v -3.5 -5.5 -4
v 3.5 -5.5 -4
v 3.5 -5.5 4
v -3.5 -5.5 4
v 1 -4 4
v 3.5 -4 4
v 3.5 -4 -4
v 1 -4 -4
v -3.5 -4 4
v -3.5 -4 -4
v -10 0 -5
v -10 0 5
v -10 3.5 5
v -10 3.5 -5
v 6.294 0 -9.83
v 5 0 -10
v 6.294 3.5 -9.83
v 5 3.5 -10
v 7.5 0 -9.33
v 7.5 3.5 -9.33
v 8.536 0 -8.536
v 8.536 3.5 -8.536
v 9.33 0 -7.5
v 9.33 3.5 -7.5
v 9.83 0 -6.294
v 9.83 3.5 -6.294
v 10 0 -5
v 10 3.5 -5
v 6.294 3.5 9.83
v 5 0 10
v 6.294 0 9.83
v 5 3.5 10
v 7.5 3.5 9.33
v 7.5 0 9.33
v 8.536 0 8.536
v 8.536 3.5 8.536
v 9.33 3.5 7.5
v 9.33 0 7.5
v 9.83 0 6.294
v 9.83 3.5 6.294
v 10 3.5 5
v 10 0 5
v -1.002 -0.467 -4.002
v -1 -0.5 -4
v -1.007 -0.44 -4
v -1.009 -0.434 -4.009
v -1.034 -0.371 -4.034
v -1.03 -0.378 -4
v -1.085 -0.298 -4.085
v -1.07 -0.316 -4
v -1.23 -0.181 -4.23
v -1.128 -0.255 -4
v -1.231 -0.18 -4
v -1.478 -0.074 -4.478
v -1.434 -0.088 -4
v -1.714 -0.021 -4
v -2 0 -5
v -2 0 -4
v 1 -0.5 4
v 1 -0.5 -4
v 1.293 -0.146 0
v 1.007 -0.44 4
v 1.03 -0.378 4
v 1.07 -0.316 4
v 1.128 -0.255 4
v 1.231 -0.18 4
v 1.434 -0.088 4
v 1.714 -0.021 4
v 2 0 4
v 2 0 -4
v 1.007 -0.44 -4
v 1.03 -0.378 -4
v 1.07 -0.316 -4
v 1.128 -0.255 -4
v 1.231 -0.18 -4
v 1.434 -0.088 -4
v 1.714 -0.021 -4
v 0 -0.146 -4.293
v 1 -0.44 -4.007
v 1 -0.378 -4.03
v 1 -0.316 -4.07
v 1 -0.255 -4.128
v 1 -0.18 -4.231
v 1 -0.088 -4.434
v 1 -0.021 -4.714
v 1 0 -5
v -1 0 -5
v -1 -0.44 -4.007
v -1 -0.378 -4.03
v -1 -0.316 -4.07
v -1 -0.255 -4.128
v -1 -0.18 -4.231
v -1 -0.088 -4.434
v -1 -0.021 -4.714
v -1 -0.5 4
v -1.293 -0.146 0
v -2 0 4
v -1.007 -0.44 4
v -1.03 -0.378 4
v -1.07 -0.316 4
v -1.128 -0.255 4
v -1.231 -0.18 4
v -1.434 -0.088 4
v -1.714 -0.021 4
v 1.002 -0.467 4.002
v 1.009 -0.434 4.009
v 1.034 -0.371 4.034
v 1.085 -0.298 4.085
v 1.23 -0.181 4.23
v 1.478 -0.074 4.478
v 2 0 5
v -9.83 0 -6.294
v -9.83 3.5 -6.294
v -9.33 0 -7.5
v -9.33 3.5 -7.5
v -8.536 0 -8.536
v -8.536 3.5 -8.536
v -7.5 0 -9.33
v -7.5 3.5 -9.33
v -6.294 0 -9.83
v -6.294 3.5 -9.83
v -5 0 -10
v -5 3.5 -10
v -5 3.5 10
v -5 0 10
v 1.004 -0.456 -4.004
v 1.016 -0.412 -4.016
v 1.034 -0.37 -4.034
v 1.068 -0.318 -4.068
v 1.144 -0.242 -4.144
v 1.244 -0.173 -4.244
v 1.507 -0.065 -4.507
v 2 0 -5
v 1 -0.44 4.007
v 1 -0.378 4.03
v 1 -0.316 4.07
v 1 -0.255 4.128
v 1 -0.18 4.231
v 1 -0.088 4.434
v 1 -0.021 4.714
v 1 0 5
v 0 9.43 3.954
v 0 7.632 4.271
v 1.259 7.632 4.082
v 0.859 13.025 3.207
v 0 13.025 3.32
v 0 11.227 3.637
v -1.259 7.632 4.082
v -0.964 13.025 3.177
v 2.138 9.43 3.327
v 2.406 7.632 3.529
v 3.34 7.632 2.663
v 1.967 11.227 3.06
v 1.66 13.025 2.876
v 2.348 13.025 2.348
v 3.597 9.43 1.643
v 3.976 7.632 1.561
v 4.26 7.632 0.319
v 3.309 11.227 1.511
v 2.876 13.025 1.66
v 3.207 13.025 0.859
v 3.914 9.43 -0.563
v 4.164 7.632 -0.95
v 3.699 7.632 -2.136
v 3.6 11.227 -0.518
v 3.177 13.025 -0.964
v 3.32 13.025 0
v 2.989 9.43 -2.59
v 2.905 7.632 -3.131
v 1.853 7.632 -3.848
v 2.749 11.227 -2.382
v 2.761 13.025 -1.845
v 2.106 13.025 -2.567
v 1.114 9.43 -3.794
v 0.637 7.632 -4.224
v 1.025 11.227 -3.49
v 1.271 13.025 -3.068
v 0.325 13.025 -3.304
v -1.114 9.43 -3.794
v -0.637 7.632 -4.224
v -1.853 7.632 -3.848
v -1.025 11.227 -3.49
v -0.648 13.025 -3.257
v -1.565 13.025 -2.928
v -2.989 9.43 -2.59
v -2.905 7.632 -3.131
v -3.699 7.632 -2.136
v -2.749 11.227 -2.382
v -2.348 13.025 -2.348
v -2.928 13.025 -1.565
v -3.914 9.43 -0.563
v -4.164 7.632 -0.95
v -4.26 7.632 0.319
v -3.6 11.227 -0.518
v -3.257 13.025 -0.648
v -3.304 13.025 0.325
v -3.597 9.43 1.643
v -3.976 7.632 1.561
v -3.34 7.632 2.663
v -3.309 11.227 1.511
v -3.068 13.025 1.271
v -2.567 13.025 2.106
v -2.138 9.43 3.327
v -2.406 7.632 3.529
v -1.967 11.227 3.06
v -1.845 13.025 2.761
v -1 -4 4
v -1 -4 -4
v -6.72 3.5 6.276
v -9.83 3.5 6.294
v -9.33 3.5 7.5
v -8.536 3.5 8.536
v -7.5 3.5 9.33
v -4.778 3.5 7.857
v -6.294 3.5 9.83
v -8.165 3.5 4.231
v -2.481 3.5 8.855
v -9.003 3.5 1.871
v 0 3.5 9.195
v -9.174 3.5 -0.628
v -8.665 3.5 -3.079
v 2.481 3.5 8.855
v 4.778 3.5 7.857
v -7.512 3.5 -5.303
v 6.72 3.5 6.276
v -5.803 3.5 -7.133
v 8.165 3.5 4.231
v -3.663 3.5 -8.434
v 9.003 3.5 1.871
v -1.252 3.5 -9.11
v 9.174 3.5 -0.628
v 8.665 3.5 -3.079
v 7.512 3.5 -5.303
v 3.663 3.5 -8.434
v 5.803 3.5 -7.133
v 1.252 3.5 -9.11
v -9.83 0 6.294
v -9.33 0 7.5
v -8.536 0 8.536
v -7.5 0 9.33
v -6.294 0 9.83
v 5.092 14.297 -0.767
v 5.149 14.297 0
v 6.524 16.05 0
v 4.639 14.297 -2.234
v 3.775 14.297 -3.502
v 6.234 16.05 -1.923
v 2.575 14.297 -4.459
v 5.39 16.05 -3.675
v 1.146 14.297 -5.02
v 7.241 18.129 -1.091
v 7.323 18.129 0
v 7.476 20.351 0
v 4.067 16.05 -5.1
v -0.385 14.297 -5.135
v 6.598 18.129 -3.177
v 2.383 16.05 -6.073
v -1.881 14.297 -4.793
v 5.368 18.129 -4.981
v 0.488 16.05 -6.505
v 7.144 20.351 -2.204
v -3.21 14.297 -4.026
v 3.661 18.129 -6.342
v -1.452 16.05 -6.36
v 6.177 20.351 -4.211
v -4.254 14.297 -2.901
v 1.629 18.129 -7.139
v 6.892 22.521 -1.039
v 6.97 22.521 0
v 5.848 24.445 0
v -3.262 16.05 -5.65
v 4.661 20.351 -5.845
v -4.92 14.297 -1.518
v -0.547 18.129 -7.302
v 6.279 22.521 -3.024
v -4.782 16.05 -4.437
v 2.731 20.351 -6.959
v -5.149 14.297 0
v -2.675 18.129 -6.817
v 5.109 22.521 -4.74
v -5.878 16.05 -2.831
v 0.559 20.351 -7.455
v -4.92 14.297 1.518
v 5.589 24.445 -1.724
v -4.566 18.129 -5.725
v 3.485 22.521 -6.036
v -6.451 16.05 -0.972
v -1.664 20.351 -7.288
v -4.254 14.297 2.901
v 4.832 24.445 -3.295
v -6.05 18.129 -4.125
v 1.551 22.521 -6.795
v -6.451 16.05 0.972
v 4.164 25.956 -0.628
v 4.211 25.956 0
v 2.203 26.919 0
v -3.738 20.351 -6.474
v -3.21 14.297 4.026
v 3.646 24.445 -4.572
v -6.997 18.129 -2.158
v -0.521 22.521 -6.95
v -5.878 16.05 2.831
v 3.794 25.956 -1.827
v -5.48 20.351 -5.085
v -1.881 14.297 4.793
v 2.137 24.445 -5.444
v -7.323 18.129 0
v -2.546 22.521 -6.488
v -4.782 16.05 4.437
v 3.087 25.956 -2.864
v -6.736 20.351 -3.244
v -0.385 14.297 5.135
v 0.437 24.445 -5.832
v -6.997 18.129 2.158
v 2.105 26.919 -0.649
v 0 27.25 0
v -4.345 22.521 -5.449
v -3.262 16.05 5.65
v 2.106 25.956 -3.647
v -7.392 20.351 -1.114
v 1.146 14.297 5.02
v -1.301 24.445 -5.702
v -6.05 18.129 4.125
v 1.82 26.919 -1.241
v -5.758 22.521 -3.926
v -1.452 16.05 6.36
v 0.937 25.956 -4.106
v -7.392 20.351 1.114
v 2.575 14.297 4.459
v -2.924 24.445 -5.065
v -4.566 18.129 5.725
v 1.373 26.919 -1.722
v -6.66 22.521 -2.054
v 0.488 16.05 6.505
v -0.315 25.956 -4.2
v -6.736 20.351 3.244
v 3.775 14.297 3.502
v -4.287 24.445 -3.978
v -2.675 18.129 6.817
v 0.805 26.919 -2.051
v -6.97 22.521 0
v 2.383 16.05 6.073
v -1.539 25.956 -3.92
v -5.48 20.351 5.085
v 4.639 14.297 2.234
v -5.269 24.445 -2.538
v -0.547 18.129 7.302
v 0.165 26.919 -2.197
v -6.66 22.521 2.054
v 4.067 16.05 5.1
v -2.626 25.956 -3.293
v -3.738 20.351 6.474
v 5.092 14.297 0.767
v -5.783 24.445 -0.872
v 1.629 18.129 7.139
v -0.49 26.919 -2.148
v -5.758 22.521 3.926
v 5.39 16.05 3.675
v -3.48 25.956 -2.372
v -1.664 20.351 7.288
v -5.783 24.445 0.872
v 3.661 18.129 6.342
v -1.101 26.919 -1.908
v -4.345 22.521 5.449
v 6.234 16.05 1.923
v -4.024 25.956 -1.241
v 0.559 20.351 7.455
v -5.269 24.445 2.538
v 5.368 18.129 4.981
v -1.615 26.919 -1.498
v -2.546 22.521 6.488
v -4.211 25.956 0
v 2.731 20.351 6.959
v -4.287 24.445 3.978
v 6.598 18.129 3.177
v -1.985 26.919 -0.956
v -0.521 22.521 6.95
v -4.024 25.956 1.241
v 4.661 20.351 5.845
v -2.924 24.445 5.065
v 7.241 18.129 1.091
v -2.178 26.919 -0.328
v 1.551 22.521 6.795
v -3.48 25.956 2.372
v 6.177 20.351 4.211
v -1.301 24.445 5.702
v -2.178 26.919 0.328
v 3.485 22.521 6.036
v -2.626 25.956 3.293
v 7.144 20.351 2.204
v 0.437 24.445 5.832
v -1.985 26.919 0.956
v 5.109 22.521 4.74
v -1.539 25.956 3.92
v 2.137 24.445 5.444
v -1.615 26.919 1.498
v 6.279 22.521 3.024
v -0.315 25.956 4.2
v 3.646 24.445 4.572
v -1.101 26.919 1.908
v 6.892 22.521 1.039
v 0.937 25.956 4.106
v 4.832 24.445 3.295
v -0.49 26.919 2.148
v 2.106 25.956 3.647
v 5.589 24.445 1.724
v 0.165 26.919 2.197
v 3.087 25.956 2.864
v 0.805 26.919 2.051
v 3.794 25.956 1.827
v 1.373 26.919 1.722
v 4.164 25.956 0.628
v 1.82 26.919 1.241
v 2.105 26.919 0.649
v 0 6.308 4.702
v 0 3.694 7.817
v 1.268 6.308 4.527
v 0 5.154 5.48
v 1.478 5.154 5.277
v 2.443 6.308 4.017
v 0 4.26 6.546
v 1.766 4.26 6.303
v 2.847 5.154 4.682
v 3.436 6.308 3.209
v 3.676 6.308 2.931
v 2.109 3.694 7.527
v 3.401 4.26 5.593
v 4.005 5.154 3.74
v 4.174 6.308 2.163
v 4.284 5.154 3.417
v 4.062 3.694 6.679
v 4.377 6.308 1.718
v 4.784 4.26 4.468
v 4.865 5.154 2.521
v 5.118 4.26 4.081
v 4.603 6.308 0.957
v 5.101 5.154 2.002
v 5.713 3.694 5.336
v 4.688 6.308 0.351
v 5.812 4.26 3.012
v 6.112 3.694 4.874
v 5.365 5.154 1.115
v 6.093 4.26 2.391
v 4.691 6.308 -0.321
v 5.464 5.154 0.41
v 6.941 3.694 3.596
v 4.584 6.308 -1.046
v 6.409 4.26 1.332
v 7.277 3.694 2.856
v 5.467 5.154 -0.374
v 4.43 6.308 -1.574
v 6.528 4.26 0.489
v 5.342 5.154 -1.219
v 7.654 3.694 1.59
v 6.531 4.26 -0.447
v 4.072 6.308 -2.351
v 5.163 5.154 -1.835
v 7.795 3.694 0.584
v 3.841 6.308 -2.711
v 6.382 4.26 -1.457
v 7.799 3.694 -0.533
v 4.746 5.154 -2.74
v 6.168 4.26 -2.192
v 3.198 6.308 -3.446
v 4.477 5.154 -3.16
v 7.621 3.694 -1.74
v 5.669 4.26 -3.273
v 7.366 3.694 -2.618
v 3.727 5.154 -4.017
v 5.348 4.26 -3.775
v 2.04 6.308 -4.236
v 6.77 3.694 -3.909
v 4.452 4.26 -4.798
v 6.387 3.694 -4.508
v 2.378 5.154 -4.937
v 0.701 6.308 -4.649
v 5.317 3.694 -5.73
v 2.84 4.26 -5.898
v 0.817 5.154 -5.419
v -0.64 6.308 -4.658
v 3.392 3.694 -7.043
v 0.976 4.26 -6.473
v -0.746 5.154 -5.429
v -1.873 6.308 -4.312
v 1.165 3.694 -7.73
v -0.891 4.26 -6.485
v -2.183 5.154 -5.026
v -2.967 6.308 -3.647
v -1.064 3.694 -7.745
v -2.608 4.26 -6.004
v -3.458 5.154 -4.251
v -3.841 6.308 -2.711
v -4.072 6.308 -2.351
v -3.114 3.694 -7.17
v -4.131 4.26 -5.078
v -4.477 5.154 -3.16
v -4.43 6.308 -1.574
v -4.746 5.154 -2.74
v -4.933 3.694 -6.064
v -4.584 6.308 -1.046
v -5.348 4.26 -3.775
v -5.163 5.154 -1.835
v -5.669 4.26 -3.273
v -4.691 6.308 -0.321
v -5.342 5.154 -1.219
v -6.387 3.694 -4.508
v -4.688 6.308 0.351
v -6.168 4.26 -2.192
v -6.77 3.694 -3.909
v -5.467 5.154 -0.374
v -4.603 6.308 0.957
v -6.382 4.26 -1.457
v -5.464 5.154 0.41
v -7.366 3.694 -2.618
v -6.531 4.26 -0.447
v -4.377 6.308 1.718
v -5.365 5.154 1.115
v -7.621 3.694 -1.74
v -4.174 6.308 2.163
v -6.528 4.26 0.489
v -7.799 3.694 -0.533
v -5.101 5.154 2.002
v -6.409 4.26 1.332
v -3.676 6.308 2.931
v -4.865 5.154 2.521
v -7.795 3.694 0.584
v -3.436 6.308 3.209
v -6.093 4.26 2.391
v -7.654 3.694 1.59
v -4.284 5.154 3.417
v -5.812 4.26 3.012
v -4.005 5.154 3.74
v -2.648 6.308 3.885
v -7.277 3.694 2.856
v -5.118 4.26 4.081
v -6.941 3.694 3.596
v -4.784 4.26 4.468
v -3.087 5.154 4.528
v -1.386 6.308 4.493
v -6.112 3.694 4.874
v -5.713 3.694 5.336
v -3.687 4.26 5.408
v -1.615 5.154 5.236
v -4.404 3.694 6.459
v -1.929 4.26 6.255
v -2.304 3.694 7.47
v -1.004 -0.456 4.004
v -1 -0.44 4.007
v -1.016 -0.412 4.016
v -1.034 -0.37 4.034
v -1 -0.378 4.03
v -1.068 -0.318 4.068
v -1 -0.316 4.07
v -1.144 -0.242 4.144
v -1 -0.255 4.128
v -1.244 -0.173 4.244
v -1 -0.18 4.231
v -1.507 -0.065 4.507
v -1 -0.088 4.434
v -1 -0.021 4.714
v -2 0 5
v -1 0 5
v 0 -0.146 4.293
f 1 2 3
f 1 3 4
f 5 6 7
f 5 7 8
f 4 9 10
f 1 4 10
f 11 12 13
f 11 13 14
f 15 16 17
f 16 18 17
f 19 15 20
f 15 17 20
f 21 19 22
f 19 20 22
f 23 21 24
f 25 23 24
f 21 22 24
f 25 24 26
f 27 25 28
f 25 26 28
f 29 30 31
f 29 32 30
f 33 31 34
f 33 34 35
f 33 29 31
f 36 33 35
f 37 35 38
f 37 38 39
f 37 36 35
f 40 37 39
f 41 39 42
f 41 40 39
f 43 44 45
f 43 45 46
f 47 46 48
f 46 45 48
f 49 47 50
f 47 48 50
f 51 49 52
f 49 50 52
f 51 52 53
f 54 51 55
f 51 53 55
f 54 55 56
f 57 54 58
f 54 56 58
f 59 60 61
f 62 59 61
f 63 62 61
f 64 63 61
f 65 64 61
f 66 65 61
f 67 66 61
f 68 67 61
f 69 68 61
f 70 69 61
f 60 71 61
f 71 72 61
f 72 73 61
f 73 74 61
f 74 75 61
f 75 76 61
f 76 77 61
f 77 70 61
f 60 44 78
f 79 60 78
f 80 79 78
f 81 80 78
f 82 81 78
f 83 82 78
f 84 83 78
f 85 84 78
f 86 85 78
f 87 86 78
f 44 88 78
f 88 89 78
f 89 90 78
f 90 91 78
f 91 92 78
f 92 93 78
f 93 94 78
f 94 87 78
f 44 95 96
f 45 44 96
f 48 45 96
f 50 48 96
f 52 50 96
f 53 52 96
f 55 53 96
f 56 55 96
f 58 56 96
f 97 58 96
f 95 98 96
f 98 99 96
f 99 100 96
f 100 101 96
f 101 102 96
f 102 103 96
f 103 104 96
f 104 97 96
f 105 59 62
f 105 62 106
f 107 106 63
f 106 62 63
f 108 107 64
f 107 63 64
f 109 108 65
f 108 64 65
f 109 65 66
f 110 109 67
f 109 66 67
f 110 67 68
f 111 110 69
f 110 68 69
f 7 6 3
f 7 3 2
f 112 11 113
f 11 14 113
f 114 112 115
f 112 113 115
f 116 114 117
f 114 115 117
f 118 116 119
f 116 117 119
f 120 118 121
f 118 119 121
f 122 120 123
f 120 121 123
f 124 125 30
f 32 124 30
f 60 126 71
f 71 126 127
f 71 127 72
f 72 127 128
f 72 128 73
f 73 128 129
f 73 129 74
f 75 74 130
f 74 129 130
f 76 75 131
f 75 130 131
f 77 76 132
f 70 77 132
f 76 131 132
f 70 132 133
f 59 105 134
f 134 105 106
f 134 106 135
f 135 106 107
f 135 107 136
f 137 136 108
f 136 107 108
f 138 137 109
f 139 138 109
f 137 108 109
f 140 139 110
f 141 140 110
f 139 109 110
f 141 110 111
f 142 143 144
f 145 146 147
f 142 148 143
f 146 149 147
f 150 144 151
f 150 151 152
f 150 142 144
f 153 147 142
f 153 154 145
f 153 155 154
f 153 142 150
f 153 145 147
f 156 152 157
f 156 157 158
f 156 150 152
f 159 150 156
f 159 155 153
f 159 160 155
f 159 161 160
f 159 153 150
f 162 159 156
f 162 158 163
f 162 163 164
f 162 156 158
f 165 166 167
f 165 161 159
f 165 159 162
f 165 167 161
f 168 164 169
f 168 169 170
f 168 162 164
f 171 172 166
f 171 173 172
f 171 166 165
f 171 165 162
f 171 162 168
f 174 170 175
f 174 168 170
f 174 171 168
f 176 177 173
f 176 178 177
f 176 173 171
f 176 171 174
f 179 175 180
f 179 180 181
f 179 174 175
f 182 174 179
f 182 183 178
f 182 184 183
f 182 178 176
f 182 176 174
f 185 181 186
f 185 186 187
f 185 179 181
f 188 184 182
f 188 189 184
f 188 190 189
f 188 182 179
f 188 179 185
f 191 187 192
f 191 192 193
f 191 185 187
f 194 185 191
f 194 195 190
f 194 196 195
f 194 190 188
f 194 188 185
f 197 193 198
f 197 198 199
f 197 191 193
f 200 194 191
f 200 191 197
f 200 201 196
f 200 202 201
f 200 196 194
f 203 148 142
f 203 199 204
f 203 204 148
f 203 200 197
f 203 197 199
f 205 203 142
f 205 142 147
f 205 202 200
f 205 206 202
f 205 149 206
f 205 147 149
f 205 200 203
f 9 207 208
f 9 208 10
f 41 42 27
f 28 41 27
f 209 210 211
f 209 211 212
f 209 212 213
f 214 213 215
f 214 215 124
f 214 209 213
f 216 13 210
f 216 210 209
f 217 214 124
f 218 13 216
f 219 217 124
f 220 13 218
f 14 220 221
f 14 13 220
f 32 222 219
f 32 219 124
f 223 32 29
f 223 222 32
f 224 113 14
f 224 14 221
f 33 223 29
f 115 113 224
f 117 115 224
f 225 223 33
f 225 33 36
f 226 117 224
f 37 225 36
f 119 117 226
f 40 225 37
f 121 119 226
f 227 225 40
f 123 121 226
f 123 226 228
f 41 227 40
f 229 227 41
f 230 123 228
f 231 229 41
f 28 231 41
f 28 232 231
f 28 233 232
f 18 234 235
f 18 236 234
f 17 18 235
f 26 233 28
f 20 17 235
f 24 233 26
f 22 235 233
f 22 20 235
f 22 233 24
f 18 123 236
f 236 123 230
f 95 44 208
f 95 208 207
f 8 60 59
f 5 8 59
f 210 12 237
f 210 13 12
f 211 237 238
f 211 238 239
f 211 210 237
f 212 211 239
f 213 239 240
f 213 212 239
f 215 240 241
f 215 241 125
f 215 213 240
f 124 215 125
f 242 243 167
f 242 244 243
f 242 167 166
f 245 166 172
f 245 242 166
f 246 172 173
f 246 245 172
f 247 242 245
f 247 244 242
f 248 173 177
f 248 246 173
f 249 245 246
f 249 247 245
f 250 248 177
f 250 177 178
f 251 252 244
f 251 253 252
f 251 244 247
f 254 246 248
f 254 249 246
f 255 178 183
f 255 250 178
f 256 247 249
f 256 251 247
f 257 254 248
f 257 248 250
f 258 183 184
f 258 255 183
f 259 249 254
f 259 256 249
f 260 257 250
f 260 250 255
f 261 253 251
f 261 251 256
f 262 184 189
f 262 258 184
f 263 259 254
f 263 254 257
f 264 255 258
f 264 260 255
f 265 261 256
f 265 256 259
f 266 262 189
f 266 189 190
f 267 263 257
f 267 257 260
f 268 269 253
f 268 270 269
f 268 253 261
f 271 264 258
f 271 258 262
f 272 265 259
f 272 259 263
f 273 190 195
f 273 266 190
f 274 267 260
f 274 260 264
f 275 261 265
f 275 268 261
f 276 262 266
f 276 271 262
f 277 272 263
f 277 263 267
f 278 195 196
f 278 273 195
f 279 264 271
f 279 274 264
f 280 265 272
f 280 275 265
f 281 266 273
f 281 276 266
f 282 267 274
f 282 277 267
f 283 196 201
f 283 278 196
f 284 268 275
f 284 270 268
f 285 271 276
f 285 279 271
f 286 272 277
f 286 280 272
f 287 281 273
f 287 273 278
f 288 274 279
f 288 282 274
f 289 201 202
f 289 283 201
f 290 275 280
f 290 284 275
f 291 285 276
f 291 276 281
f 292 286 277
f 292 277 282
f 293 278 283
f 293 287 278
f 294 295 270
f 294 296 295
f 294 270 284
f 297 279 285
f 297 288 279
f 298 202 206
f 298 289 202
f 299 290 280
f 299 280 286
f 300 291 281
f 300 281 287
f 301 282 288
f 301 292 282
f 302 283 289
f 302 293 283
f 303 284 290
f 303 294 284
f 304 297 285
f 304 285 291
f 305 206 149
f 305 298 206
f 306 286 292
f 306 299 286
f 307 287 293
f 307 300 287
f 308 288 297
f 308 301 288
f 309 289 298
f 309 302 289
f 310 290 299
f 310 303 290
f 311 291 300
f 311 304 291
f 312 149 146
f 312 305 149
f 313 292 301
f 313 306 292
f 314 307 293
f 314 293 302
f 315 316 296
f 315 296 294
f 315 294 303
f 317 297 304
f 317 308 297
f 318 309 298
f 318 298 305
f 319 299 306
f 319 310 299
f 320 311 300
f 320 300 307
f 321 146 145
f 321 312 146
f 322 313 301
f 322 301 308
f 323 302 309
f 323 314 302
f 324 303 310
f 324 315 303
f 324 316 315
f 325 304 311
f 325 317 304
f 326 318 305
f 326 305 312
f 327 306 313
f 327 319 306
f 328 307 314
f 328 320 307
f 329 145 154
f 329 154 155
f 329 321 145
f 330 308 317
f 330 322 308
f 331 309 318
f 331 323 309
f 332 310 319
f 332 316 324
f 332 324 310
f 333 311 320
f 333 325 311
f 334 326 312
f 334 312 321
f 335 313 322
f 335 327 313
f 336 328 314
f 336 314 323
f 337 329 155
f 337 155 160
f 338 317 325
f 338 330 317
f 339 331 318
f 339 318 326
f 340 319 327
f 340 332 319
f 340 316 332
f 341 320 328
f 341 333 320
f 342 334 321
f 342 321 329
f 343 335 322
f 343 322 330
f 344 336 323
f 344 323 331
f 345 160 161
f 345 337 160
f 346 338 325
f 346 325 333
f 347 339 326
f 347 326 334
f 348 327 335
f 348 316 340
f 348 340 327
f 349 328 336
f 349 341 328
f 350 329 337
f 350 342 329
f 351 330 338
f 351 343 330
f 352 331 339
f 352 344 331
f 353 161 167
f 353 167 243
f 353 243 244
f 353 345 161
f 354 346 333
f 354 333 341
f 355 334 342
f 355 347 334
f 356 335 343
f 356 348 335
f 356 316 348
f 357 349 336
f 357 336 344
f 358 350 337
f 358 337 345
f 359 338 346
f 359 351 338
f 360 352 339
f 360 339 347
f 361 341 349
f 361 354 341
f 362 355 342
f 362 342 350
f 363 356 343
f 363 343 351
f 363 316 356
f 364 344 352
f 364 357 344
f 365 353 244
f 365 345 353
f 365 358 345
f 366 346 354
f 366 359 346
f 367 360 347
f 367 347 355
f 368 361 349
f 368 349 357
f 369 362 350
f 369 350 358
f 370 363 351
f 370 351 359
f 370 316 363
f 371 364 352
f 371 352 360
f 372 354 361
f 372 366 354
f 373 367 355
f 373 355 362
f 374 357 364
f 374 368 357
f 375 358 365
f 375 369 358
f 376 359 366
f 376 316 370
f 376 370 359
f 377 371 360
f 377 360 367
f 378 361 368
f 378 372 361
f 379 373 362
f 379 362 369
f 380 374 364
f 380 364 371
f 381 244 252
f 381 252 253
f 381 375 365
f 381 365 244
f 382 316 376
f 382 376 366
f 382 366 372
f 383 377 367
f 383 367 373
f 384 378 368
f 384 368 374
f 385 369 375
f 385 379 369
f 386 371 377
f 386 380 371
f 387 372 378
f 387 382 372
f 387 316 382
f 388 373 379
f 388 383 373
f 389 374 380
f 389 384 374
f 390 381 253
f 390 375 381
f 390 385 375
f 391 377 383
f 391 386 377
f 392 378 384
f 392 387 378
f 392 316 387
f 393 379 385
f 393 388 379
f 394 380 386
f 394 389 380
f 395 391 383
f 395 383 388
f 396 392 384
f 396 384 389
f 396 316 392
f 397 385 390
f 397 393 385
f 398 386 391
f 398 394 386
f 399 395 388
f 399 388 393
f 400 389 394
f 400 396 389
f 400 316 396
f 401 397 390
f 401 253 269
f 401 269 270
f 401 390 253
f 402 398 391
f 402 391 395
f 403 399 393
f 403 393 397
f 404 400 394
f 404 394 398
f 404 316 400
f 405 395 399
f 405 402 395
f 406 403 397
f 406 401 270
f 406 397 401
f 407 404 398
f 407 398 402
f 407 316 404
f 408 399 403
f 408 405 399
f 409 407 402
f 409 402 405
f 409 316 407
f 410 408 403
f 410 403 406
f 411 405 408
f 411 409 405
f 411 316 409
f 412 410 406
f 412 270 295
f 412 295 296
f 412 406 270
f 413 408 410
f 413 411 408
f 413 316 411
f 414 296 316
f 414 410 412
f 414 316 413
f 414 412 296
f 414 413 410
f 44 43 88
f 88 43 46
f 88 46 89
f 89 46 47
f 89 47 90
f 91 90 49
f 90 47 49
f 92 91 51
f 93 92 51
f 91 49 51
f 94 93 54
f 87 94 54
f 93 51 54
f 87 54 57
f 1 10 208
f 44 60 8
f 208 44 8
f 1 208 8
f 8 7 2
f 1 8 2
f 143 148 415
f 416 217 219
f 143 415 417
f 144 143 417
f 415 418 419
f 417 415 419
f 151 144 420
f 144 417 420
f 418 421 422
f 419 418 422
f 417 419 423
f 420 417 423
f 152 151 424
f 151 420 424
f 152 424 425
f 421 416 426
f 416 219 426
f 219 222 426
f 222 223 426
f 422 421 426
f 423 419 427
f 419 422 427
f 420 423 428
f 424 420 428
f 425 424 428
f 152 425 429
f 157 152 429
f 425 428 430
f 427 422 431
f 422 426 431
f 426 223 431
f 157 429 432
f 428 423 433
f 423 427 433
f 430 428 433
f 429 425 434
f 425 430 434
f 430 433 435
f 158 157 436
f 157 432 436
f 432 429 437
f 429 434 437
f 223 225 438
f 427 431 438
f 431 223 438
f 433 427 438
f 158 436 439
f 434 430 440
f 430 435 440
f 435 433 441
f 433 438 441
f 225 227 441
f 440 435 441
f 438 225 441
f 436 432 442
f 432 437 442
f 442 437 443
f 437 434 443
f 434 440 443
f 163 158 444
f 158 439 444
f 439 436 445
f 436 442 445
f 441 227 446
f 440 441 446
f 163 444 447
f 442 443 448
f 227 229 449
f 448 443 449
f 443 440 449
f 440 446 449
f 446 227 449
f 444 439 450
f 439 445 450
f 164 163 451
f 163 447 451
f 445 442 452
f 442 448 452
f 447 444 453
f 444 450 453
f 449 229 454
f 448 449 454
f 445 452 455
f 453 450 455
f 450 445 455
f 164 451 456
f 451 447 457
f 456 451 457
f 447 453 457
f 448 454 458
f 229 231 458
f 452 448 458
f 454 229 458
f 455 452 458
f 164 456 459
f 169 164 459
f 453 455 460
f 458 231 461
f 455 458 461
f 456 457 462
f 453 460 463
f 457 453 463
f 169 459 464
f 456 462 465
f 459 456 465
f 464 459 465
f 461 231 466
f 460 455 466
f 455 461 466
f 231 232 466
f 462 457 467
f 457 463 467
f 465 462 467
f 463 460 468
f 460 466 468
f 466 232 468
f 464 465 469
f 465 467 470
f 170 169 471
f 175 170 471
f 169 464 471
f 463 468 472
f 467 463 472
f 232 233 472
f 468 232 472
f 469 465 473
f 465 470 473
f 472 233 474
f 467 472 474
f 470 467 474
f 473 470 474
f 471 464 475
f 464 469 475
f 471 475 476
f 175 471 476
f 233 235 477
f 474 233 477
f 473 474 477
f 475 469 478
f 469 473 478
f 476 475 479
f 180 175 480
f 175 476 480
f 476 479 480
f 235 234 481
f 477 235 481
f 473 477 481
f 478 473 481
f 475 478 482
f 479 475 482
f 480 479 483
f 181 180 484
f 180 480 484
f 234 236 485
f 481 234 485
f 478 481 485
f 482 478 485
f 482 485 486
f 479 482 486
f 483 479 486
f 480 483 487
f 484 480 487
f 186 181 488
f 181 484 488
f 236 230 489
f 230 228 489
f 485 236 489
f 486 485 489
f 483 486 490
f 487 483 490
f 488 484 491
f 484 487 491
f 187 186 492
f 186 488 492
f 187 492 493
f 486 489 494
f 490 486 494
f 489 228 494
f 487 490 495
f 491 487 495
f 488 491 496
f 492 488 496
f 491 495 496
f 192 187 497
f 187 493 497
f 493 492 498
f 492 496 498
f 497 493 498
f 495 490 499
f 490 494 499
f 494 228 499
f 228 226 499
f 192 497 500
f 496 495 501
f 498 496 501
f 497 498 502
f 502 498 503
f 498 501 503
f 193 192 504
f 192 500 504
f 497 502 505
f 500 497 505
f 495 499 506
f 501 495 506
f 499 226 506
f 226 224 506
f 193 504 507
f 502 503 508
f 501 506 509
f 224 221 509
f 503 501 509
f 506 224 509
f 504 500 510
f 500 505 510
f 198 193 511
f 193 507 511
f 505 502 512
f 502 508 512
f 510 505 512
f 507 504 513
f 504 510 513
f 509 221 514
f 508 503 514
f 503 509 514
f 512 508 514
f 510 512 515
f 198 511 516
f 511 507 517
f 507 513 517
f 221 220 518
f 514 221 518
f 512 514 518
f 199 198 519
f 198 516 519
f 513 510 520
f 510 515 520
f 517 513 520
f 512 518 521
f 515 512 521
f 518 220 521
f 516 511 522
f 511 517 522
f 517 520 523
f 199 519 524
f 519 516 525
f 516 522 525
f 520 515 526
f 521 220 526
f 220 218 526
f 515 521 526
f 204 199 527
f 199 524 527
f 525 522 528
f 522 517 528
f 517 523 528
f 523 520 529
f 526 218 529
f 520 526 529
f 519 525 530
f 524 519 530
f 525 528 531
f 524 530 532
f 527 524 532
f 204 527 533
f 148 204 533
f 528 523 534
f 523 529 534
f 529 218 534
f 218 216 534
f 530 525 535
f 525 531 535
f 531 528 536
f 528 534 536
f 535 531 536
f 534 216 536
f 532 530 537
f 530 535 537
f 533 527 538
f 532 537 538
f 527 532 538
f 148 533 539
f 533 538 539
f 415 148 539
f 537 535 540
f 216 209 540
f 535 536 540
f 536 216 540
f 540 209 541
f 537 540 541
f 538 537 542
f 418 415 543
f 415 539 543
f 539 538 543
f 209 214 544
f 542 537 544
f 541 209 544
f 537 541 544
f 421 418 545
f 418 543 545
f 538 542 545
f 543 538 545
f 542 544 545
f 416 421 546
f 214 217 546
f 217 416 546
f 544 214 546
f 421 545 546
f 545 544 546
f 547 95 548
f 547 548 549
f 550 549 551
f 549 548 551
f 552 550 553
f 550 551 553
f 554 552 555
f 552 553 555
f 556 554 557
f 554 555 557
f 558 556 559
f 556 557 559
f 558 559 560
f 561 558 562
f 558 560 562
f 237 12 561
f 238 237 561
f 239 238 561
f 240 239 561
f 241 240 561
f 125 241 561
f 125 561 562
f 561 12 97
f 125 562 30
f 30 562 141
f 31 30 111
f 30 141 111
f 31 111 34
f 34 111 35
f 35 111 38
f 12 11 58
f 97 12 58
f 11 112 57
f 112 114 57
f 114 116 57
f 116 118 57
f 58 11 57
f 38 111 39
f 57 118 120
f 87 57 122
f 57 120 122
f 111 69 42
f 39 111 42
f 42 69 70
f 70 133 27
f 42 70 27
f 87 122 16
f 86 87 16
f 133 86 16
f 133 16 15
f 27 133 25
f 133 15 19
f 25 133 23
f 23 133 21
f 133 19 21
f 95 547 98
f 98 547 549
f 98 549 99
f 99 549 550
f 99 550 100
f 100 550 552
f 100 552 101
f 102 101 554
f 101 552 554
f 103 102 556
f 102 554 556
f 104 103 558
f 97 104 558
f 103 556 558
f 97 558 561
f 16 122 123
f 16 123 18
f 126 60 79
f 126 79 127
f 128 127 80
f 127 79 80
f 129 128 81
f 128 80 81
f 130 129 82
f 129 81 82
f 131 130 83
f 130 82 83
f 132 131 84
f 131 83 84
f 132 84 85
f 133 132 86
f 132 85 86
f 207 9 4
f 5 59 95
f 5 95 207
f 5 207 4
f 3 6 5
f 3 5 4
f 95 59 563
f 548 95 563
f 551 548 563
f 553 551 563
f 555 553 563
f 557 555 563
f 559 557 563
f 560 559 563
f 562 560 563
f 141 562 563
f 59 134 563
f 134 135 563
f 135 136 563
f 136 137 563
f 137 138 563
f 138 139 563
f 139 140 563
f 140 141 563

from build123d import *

# Parameters (mm, degrees)
SKETCH1_W           = 20
SKETCH1_H           = 20
BOSS_EXTRUDE1_DEPTH = 3.5
SKETCH2_R           = 5
BOSS_EXTRUDE2_DEPTH = 10
CHAMFER1_SIZE       = 10
CHAMFER1_SIZE_2     = 1.763269807
FILLET1_R           = 5
FILLET2_R           = 5
SKETCH9_W           = 2
SKETCH9_H           = 8
BOSS_EXTRUDE4_DEPTH = 4
SKETCH10_W          = 7
SKETCH10_H          = 8
BOSS_EXTRUDE5_DEPTH = 1.5
FILLET3_SIZE        = 0.5
FILLET3_SIZE_2      = 1


# Read off the part's stored shape, not the designer's step: Revolve5
with BuildPart() as part:
    # Sketch1 → Boss-Extrude1 (new body)
    with BuildSketch(Plane(origin=(0, 0, 0), x_dir=(1, 0, 0), z_dir=(0, 1, 0))):
        Rectangle(SKETCH1_W, SKETCH1_H)
    extrude(amount=BOSS_EXTRUDE1_DEPTH)

    # Sketch2 → Boss-Extrude2 (add)
    with BuildSketch(Plane(origin=(0, 3.5, 0), x_dir=(1, 0, 0), z_dir=(0, 1, 0))):
        with Locations(Location((0, 0, 0), (0, 0, 270))):
            Circle(SKETCH2_R)
    extrude(amount=BOSS_EXTRUDE2_DEPTH)

    # Chamfer1
    # the kernel refuses this chamfer: 10, 1.763269807 mm, written as the material it takes off along each edge
    with BuildSketch(Plane(origin=(0, 13.5, 0), x_dir=(0, 0, 1), z_dir=(-1, 0, 0))) as chamfer1_piece_1_section:
        Polygon((5, -CHAMFER1_SIZE), (5 - CHAMFER1_SIZE_2, 0), (5, 0), align=None)
    chamfer1_piece_1 = revolve(axis=Axis((0, 13.5, 0), (0, 1, 0)), mode=Mode.PRIVATE)
    chamfer1_piece_1 = split(chamfer1_piece_1, bisect_by=Plane(origin=(0, 3.5, -4.151256053), z_dir=(0, 1, 0)), keep=Keep.TOP, mode=Mode.PRIVATE)
    add(chamfer1_piece_1, mode=Mode.SUBTRACT)

    # Fillet1
    fillet1_edges = [part.edges().sort_by_distance(p)[0] for p in [
        (10, 1.75, 10),
        (-10, 1.75, 10),
        (-10, 1.75, -10),
        (10, 1.75, -10),
    ]]
    fillet(fillet1_edges, radius=FILLET1_R)

    # Revolve5 outline → Revolve5 (revolve)
    with BuildSketch(Plane.XY):
        with BuildLine():
            ThreePointArc((3.320470439, 13.025085423), (7.303658649, 21.454866662), (0, 27.25))
            Line((0, 27.25), (0, 13.5))
            Line((0, 13.5), (3.236730193, 13.5))
            Line((3.236730193, 13.5), (3.236730193, 13.025085423))
            Line((3.236730193, 13.025085423), (3.320470439, 13.025085423))
        make_face()
    revolve(axis=Axis((0, 0, 0), (0, 1, 0)))

    # Fillet2
    fillet2_edges = [part.edges().sort_by_distance(p)[0] for p in [
        (0, 3.5, -5),
    ]]
    fillet(fillet2_edges, radius=FILLET2_R)

    # Sketch9 → Boss-Extrude4 (add)
    with BuildSketch(Plane.XZ):
        Rectangle(SKETCH9_W, SKETCH9_H)
    extrude(amount=BOSS_EXTRUDE4_DEPTH)

    # Sketch10 → Boss-Extrude5 (add)
    with BuildSketch(Plane(origin=(0, -4, 0), x_dir=(-1, 0, 0), z_dir=(0, -1, 0))):
        Rectangle(SKETCH10_W, SKETCH10_H)
    extrude(amount=BOSS_EXTRUDE5_DEPTH)

    # Fillet3
    # an asymmetric fillet: 1, 0.5 mm, written as the material it adds along each edge
    with BuildSketch(Plane(origin=(1, 0, -4), x_dir=(0, -1, 0), z_dir=(0, 0, 1)), Plane(origin=(-1, 0, 4), x_dir=(0, -1, 0), z_dir=(0, 0, -1))) as fillet3_piece_1:
        with BuildLine():
            Bezier((FILLET3_SIZE, 0), (0, 0), (0, FILLET3_SIZE_2), weights=[1, 0.707106781, 1])
            Line((0, FILLET3_SIZE_2), (0, 0))
            Line((0, 0), (FILLET3_SIZE, 0))
        make_face()
    extrude(amount=8)
    with BuildSketch(Plane(origin=(1, 0, 4), x_dir=(0, -1, 0), z_dir=(-1, 0, 0)), Plane(origin=(-1, 0, -4), x_dir=(0, -1, 0), z_dir=(1, 0, 0))) as fillet3_piece_2:
        with BuildLine():
            Bezier((FILLET3_SIZE, 0), (0, 0), (0, FILLET3_SIZE_2), weights=[1, 0.707106781, 1])
            Line((0, FILLET3_SIZE_2), (0, 0))
            Line((0, 0), (FILLET3_SIZE, 0))
        make_face()
    extrude(amount=2)
    with BuildSketch(Plane(origin=(-1, 0, -4), x_dir=(0, -1, 0), z_dir=(1, 0, 0))) as fillet3_piece_3a_section:
        with BuildLine():
            Bezier((FILLET3_SIZE, 0), (0, 0), (0, FILLET3_SIZE_2), weights=[1, 0.707106781, 1])
            Line((0, FILLET3_SIZE_2), (0, 0))
            Line((0, 0), (FILLET3_SIZE, 0))
        make_face()
    fillet3_piece_3a = extrude(amount=4.5, mode=Mode.PRIVATE)
    fillet3_piece_3a = split(fillet3_piece_3a, bisect_by=Plane(origin=(1, -0.103701438, -4.24592111), z_dir=(1, 0, 0)), keep=Keep.TOP, mode=Mode.PRIVATE)
    with BuildSketch(Plane(origin=(1, 0, -6.5), x_dir=(0, -1, 0), z_dir=(0, 0, 1))) as fillet3_piece_3b_section:
        with BuildLine():
            Bezier((FILLET3_SIZE, 0), (0, 0), (0, FILLET3_SIZE_2), weights=[1, 0.707106781, 1])
            Line((0, FILLET3_SIZE_2), (0, 0))
            Line((0, 0), (FILLET3_SIZE, 0))
        make_face()
    fillet3_piece_3b = extrude(amount=10.5, mode=Mode.PRIVATE)
    fillet3_piece_3b = split(fillet3_piece_3b, bisect_by=Plane(origin=(1.245921261, -0.103701518, -4), z_dir=(0, 0, -1)), keep=Keep.TOP, mode=Mode.PRIVATE)
    fillet3_piece_3 = fillet3_piece_3a & fillet3_piece_3b
    add(fillet3_piece_3)
    with BuildSketch(Plane(origin=(3.5, 0, 4), x_dir=(0, -1, 0), z_dir=(-1, 0, 0))) as fillet3_piece_4a_section:
        with BuildLine():
            Bezier((FILLET3_SIZE, 0), (0, 0), (0, FILLET3_SIZE_2), weights=[1, 0.707106781, 1])
            Line((0, FILLET3_SIZE_2), (0, 0))
            Line((0, 0), (FILLET3_SIZE, 0))
        make_face()
    fillet3_piece_4a = extrude(amount=4.5, mode=Mode.PRIVATE)
    fillet3_piece_4a = split(fillet3_piece_4a, bisect_by=Plane(origin=(1, -0.103701518, 4.245921261), z_dir=(1, 0, 0)), keep=Keep.TOP, mode=Mode.PRIVATE)
    with BuildSketch(Plane(origin=(1, 0, -4), x_dir=(0, -1, 0), z_dir=(0, 0, 1))) as fillet3_piece_4b_section:
        with BuildLine():
            Bezier((FILLET3_SIZE, 0), (0, 0), (0, FILLET3_SIZE_2), weights=[1, 0.707106781, 1])
            Line((0, FILLET3_SIZE_2), (0, 0))
            Line((0, 0), (FILLET3_SIZE, 0))
        make_face()
    fillet3_piece_4b = extrude(amount=10.5, mode=Mode.PRIVATE)
    fillet3_piece_4b = split(fillet3_piece_4b, bisect_by=Plane(origin=(1.24592111, -0.103701438, 4), z_dir=(0, 0, 1)), keep=Keep.TOP, mode=Mode.PRIVATE)
    fillet3_piece_4 = fillet3_piece_4a & fillet3_piece_4b
    add(fillet3_piece_4)
    with BuildSketch(Plane(origin=(1, 0, 4), x_dir=(0, -1, 0), z_dir=(-1, 0, 0))) as fillet3_piece_5a_section:
        with BuildLine():
            Bezier((FILLET3_SIZE, 0), (0, 0), (0, FILLET3_SIZE_2), weights=[1, 0.707106781, 1])
            Line((0, FILLET3_SIZE_2), (0, 0))
            Line((0, 0), (FILLET3_SIZE, 0))
        make_face()
    fillet3_piece_5a = extrude(amount=4.5, mode=Mode.PRIVATE)
    fillet3_piece_5a = split(fillet3_piece_5a, bisect_by=Plane(origin=(-1, -0.103701438, 4.24592111), z_dir=(-1, 0, 0)), keep=Keep.TOP, mode=Mode.PRIVATE)
    with BuildSketch(Plane(origin=(-1, 0, 6.5), x_dir=(0, -1, 0), z_dir=(0, 0, -1))) as fillet3_piece_5b_section:
        with BuildLine():
            Bezier((FILLET3_SIZE, 0), (0, 0), (0, FILLET3_SIZE_2), weights=[1, 0.707106781, 1])
            Line((0, FILLET3_SIZE_2), (0, 0))
            Line((0, 0), (FILLET3_SIZE, 0))
        make_face()
    fillet3_piece_5b = extrude(amount=10.5, mode=Mode.PRIVATE)
    fillet3_piece_5b = split(fillet3_piece_5b, bisect_by=Plane(origin=(-1.245921261, -0.103701518, 4), z_dir=(0, 0, 1)), keep=Keep.TOP, mode=Mode.PRIVATE)
    fillet3_piece_5 = fillet3_piece_5a & fillet3_piece_5b
    add(fillet3_piece_5)
    with BuildSketch(Plane(origin=(-3.5, 0, -4), x_dir=(0, -1, 0), z_dir=(1, 0, 0))) as fillet3_piece_6a_section:
        with BuildLine():
            Bezier((FILLET3_SIZE, 0), (0, 0), (0, FILLET3_SIZE_2), weights=[1, 0.707106781, 1])
            Line((0, FILLET3_SIZE_2), (0, 0))
            Line((0, 0), (FILLET3_SIZE, 0))
        make_face()
    fillet3_piece_6a = extrude(amount=4.5, mode=Mode.PRIVATE)
    fillet3_piece_6a = split(fillet3_piece_6a, bisect_by=Plane(origin=(-1, -0.103701518, -4.245921261), z_dir=(-1, 0, 0)), keep=Keep.TOP, mode=Mode.PRIVATE)
    with BuildSketch(Plane(origin=(-1, 0, 4), x_dir=(0, -1, 0), z_dir=(0, 0, -1))) as fillet3_piece_6b_section:
        with BuildLine():
            Bezier((FILLET3_SIZE, 0), (0, 0), (0, FILLET3_SIZE_2), weights=[1, 0.707106781, 1])
            Line((0, FILLET3_SIZE_2), (0, 0))
            Line((0, 0), (FILLET3_SIZE, 0))
        make_face()
    fillet3_piece_6b = extrude(amount=10.5, mode=Mode.PRIVATE)
    fillet3_piece_6b = split(fillet3_piece_6b, bisect_by=Plane(origin=(-1.24592111, -0.103701438, -4), z_dir=(0, 0, -1)), keep=Keep.TOP, mode=Mode.PRIVATE)
    fillet3_piece_6 = fillet3_piece_6a & fillet3_piece_6b
    add(fillet3_piece_6)


solid = part.part
